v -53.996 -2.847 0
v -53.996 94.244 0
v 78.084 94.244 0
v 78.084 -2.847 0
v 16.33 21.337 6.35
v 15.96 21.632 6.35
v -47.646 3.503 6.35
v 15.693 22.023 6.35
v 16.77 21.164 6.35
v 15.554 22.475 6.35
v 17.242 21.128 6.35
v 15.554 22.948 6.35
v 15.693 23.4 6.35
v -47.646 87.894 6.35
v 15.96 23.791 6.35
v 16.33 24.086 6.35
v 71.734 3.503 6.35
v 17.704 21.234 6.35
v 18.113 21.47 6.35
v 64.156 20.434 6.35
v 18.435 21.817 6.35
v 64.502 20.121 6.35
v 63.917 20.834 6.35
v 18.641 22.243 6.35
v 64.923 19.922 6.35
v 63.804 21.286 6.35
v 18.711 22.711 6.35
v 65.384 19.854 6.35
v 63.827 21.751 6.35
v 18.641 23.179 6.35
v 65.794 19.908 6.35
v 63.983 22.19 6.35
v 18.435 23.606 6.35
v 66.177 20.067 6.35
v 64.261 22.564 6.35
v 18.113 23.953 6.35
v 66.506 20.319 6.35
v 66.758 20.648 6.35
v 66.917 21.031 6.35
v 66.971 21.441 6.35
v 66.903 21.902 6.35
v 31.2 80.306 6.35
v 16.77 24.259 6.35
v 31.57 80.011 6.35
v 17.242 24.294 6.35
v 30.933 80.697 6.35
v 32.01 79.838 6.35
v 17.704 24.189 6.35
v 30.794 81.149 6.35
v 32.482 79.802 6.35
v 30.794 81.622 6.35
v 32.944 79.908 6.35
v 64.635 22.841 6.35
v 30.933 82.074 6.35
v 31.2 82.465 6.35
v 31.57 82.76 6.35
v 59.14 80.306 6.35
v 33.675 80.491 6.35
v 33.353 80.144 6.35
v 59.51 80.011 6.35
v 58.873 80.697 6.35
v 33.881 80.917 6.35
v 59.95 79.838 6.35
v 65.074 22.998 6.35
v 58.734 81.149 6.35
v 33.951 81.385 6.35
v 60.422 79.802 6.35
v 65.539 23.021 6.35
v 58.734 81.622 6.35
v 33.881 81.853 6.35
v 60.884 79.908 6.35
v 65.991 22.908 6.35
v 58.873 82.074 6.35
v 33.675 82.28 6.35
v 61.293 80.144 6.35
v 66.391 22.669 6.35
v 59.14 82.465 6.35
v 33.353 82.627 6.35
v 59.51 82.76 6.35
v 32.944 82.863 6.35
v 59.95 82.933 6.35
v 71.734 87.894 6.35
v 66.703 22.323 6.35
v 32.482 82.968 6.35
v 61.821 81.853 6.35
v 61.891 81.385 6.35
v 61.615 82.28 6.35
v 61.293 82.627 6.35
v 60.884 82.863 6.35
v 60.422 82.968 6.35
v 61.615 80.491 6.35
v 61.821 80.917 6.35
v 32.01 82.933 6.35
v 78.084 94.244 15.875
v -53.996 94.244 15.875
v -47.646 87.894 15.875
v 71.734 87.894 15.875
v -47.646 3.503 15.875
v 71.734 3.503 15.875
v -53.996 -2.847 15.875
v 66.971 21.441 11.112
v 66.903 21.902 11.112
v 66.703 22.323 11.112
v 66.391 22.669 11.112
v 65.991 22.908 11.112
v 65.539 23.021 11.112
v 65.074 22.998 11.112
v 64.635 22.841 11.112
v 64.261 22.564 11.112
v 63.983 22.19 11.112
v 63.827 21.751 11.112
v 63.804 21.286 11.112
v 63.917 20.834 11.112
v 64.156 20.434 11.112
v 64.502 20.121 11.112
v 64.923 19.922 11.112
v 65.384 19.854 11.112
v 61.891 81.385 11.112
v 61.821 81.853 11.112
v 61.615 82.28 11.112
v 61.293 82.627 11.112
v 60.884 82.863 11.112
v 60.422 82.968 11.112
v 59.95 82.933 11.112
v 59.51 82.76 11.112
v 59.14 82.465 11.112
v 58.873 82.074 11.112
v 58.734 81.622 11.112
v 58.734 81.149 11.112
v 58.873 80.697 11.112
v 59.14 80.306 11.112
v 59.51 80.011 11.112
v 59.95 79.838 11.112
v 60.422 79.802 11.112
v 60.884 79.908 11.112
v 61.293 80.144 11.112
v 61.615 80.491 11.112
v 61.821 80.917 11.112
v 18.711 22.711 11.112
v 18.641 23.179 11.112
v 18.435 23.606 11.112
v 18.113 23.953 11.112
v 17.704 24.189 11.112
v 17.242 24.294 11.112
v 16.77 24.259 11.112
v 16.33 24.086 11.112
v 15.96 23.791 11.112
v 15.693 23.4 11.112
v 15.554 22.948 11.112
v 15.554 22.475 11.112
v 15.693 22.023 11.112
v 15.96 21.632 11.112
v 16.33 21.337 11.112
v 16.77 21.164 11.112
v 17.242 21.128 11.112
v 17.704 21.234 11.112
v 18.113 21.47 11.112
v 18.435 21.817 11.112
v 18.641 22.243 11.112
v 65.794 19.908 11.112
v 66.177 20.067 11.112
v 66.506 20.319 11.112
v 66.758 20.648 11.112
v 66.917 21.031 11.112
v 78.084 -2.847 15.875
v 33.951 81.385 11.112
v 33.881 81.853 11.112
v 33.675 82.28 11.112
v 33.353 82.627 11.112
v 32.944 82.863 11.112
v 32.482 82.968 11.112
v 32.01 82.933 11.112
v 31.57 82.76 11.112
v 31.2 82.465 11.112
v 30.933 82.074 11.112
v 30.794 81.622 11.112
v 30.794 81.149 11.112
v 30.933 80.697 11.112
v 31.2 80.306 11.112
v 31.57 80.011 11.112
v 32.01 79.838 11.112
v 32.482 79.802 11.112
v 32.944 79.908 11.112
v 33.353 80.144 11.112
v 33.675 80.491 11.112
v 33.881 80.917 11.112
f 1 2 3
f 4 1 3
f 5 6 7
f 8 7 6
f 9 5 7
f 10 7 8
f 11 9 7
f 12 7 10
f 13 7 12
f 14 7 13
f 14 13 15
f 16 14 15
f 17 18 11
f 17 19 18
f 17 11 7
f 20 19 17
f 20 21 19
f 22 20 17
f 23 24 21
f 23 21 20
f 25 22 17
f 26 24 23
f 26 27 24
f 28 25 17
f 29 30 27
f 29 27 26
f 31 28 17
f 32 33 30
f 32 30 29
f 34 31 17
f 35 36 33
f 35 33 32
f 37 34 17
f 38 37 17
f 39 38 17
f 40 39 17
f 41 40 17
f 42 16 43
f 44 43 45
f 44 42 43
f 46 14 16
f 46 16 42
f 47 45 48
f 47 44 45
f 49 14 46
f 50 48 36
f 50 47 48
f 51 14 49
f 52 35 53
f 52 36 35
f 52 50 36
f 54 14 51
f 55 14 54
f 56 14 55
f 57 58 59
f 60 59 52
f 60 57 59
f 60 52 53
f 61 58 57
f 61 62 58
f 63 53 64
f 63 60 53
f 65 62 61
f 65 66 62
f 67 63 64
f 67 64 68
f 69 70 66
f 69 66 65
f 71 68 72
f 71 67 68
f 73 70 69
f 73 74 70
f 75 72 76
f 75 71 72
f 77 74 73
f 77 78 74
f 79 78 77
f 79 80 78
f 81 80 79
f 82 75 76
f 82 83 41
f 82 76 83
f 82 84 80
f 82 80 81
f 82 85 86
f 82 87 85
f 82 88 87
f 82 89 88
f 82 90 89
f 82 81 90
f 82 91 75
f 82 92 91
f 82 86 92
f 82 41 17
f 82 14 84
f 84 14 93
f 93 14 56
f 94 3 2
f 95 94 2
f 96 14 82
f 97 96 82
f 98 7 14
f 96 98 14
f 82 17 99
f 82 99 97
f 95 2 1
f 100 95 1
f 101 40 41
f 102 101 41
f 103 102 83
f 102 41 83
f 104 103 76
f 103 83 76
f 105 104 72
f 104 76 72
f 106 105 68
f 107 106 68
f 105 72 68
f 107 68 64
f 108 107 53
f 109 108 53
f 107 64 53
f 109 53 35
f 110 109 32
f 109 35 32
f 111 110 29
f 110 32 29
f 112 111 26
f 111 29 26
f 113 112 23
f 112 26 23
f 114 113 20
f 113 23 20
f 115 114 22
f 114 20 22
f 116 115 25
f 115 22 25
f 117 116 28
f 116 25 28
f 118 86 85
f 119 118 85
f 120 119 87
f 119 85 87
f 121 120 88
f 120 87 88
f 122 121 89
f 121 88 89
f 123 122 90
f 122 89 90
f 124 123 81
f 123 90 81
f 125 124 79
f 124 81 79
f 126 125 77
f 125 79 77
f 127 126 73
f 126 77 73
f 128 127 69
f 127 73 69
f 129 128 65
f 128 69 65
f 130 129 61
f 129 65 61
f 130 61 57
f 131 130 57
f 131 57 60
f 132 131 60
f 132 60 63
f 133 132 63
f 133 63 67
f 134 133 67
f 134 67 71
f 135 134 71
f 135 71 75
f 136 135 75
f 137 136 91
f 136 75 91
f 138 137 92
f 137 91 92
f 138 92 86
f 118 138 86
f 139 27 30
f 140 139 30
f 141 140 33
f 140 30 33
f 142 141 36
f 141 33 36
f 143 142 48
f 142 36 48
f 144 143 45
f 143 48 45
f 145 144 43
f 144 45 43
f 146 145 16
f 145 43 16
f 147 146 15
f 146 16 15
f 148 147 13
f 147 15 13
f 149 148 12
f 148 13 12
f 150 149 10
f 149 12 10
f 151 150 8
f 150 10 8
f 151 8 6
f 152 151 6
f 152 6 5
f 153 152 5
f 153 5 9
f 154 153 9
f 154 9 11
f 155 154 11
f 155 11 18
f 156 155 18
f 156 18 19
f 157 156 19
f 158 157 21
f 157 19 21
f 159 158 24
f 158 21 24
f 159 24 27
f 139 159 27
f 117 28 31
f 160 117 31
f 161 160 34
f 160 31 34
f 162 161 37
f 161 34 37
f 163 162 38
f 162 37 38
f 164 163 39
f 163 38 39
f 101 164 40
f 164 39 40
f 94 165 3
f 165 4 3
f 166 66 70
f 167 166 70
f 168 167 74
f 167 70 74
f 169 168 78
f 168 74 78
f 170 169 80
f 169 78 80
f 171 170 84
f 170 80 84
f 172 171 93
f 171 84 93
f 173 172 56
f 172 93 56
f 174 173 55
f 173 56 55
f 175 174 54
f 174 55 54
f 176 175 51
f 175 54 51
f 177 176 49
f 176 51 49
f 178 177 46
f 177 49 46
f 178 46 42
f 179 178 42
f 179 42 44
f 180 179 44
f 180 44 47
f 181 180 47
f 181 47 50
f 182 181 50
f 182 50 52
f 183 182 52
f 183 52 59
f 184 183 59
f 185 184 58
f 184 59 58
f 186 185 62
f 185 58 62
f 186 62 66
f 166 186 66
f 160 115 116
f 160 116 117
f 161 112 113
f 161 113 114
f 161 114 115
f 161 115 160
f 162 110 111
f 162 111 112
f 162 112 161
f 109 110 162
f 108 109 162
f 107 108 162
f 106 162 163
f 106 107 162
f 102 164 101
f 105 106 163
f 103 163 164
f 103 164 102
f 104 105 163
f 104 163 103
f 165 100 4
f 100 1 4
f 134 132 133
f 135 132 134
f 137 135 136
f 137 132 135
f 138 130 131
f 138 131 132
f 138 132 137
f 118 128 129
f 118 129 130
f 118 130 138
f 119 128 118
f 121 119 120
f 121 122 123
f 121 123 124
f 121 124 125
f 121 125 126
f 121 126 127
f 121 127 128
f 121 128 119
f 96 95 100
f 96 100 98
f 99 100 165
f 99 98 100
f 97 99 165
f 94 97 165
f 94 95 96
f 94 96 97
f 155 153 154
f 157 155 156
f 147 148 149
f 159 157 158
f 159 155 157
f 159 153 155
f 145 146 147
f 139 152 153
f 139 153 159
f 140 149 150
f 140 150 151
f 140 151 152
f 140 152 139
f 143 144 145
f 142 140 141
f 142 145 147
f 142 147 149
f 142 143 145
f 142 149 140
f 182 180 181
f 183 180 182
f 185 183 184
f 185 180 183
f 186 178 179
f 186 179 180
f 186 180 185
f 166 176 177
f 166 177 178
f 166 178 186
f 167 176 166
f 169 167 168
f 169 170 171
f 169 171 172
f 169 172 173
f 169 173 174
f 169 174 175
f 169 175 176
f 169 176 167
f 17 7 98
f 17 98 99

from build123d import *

# Parameters (mm, degrees)
F0_W     = 119.38
F0_H     = 84.3915
F1_DEPTH = 6.35
F2_W     = 119.38
F2_H     = 84.3915
F3_DEPTH = 9.525
F4_R     = 1.5875
F5_DEPTH = 4.7625


with BuildPart() as f1:
    # F0 (on Top) → F1 (new body)
    with BuildSketch(Plane.XY):
        Polygon((-47.6464699149, 94.2441691224), (-53.9964699149, 94.2441691224), (-53.9964699149, -2.8473308776), (78.0835300851, -2.8473308776), (78.0835300851, 0), (78.0835300851, 94.2441691224), align=None)
        with Locations((12.0435300851, 45.6984191224)):
            Rectangle(F0_W, F0_H, mode=Mode.SUBTRACT)
        with Locations((12.0435300851, 45.6984191224)):
            Rectangle(F0_W, F0_H)
    extrude(amount=F1_DEPTH)

    # F2 (on face) → F3 (join)
    with BuildSketch(Plane.XY.offset(6.35)):
        Polygon((71.7335300851, 94.2441691224), (-53.9964699149, 94.2441691224), (-53.9964699149, 87.8941691224), (-53.9964699149, -2.8473308776), (-47.6464699149, -2.8473308776), (78.0835300851, -2.8473308776), (78.0835300851, 3.5026691224), (78.0835300851, 94.2441691224), align=None)
        with Locations((12.0435300851, 45.6984191224)):
            Rectangle(F2_W, F2_H, mode=Mode.SUBTRACT)
    extrude(amount=F3_DEPTH)

    # F4 (on face) → F5 (join)
    with BuildSketch(Plane.XY.offset(6.35)):
        with Locations((32.3635300851, 81.3854191224)):
            Circle(F4_R)
        with Locations((60.3035300851, 81.3854191224)):
            Circle(F4_R)
        with Locations((17.1235300851, 22.7114191224)):
            Circle(F4_R)
        with BuildLine():
            ThreePointArc((65.3835300851, 19.8539191224), (66.5060621002, 20.3188871073), (66.9710300851, 21.4414191224))
            ThreePointArc((66.9710300851, 21.4414191224), (64.26099807, 22.5639511376), (65.3835300851, 19.8539191224))
        make_face()
    extrude(amount=F5_DEPTH)


solid = f1.part
